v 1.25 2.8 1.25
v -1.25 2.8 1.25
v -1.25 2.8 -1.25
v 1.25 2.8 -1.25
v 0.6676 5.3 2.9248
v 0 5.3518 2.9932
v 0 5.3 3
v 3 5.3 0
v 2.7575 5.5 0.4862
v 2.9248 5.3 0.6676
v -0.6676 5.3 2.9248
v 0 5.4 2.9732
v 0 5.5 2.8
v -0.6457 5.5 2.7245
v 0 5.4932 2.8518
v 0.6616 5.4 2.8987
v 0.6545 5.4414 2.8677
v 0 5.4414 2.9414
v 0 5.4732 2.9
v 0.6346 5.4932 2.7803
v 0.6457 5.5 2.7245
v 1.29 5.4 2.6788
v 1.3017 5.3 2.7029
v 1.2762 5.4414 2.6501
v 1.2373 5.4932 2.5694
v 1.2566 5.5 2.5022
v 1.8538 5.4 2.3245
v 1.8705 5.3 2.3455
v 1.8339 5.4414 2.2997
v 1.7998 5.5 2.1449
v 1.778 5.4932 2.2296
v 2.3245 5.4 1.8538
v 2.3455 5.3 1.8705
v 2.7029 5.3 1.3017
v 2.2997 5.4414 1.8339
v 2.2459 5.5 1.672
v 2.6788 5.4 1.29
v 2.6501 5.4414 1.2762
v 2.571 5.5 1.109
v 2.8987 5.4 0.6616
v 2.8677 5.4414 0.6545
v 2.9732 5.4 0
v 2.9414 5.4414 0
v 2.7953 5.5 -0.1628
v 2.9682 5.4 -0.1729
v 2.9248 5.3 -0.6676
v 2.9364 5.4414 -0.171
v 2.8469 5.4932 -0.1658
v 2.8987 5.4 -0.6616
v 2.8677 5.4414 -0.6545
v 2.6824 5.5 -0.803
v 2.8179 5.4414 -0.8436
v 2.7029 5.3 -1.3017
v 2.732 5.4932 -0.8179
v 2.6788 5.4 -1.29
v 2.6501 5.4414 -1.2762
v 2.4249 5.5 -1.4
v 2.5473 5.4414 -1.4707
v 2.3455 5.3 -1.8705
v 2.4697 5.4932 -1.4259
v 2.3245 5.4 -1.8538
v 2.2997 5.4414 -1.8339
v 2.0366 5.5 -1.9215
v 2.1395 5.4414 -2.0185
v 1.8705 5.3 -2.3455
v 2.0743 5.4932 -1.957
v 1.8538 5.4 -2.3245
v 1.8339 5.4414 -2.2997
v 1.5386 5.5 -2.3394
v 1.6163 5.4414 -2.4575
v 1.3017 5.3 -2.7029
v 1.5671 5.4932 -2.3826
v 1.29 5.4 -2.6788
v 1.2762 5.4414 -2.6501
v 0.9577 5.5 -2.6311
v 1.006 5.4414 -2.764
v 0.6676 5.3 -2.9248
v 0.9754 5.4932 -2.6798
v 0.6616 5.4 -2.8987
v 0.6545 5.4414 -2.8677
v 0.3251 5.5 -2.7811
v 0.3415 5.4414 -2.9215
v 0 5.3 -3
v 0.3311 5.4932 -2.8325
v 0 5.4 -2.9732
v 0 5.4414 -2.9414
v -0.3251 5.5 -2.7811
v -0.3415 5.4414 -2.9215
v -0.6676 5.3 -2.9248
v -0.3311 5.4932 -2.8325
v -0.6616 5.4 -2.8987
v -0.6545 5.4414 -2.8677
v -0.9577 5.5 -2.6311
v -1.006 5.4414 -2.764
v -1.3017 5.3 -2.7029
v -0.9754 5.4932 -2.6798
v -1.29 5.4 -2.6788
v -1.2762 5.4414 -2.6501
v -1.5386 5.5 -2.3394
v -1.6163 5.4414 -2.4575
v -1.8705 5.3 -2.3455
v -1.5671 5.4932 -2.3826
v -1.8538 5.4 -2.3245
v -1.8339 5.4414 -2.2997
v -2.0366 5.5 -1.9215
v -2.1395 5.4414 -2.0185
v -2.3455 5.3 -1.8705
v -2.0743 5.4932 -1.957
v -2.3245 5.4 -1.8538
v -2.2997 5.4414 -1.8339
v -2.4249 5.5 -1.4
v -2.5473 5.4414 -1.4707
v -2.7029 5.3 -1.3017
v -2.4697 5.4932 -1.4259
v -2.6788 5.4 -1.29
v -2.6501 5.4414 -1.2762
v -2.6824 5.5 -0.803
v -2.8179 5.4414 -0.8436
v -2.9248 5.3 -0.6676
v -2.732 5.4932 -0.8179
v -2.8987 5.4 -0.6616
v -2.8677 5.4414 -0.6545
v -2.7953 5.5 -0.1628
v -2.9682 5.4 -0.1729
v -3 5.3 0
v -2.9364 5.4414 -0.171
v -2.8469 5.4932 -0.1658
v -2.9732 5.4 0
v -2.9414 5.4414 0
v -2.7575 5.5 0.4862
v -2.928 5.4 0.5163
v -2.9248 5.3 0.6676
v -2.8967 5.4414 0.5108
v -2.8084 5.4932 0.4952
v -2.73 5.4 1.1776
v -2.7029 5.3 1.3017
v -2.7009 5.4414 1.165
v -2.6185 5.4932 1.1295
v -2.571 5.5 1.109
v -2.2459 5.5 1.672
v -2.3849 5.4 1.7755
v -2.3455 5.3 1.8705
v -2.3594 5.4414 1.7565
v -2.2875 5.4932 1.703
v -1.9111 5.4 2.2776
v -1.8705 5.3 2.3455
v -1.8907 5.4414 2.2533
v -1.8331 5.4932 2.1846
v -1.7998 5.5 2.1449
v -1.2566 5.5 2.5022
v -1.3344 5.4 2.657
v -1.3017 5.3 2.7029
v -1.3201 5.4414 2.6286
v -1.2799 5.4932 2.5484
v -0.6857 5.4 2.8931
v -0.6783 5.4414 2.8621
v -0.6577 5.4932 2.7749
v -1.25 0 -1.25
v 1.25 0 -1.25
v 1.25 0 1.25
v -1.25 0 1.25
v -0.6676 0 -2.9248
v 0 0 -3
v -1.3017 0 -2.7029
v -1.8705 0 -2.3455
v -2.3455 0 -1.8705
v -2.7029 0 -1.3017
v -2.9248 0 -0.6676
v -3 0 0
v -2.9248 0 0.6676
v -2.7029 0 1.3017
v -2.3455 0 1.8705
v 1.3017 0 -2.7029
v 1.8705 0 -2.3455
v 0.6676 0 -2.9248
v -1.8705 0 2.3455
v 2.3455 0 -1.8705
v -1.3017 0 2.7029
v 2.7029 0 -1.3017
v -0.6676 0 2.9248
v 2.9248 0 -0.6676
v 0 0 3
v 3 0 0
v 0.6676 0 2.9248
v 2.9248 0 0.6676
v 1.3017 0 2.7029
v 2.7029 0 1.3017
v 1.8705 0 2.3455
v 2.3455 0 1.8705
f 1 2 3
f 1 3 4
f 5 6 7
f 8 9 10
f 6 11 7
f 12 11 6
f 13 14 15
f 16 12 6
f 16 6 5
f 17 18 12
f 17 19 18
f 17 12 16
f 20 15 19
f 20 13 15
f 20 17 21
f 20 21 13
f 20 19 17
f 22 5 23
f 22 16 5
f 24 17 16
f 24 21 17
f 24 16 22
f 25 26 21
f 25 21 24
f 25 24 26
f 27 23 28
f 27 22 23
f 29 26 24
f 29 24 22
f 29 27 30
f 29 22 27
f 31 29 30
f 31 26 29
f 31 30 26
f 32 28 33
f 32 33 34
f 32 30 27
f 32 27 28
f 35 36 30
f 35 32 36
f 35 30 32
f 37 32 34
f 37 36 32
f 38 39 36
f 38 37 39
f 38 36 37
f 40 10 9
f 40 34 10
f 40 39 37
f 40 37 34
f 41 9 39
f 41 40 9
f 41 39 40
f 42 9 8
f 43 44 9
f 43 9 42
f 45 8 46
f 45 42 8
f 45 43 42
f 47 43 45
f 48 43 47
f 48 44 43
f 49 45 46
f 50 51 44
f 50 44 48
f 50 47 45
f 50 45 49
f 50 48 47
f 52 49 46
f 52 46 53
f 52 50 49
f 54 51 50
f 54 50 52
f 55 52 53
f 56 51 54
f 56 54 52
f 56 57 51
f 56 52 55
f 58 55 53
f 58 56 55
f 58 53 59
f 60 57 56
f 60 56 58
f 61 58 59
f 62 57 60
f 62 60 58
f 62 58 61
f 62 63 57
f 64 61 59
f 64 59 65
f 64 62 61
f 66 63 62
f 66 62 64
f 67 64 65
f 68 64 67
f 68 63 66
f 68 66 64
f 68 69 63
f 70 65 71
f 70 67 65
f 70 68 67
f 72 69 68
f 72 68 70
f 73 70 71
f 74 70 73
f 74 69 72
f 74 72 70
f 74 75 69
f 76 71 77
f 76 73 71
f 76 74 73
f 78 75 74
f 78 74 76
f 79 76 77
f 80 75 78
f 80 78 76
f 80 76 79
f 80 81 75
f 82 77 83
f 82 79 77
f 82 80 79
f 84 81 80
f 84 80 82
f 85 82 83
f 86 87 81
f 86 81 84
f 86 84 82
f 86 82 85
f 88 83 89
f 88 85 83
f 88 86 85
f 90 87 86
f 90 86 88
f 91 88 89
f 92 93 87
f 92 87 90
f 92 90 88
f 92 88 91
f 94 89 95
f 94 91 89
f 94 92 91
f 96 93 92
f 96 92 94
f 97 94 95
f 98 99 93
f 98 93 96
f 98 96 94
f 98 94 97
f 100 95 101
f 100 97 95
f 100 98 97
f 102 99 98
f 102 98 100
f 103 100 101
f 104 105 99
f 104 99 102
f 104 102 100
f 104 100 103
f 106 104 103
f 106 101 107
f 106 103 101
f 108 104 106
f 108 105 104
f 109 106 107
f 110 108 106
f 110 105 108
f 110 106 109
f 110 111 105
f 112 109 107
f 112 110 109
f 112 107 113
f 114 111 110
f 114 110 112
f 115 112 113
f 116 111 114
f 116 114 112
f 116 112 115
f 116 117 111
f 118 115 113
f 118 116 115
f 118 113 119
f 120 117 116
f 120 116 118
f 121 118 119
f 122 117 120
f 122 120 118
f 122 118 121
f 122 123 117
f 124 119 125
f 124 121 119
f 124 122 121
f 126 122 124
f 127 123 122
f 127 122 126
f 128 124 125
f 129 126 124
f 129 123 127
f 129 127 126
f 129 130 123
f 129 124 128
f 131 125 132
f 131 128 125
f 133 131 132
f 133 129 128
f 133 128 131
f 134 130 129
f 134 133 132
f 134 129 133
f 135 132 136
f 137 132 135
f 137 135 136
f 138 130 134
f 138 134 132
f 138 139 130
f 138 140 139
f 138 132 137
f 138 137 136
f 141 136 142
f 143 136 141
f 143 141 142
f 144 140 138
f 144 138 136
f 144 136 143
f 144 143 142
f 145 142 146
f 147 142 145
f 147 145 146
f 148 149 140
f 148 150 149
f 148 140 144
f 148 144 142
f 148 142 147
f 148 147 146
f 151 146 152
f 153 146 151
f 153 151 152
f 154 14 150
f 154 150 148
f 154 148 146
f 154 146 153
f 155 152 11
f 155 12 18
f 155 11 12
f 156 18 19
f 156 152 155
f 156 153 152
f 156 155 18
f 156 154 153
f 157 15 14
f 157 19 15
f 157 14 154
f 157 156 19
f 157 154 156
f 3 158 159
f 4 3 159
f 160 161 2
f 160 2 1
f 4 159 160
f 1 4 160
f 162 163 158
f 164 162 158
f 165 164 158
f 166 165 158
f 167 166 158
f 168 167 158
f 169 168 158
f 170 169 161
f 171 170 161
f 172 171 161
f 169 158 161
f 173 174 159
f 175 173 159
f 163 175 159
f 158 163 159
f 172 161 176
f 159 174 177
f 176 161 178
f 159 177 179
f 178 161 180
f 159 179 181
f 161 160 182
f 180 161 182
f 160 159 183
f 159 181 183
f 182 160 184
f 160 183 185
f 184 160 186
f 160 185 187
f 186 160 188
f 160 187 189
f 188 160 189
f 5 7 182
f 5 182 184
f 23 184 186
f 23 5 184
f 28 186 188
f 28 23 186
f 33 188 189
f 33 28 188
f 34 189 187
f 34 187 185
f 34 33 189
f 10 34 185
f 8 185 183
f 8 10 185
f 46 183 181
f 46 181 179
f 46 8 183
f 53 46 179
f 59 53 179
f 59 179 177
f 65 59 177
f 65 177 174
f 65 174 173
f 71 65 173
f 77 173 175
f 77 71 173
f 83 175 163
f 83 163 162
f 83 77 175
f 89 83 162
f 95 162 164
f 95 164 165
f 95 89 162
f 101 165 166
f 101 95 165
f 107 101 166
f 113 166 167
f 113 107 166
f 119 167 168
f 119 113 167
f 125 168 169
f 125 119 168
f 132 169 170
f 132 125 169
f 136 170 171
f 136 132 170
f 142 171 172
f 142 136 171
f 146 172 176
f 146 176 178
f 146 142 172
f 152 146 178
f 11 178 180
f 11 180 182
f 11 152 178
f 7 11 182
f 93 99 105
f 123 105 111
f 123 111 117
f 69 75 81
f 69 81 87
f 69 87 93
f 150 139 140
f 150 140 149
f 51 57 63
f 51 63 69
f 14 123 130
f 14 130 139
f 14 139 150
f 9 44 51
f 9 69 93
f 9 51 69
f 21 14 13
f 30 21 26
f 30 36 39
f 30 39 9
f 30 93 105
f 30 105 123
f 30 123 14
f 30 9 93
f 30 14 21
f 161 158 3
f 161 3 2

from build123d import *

# Parameters (mm, degrees)
SKETCH1_W          = 3
SKETCH1_H          = 5.5
SKETCH2_W          = 2.5
SKETCH2_H          = 2.5
CUT_EXTRUDE1_DEPTH = 2.8
FILLET1_R          = 0.2


with BuildPart() as part:
    # Sketch1 → Revolve1 (revolve)
    with BuildSketch(Plane(origin=(0, 0, 0), x_dir=(-1, 0, 0), z_dir=(0, 0, -1)), mode=Mode.PRIVATE) as revolve1_sk:
        with Locations((-1.5, 2.75)):
            Rectangle(SKETCH1_W, SKETCH1_H)
    revolve(revolve1_sk.sketch.rotate(Axis((0, 0, 0), (0, 1, 0)), 270), axis=Axis((0, 0, 0), (0, 1, 0)))

    # Sketch2 → Cut-Extrude1 (cut)
    with BuildSketch(Plane.XZ):
        Rectangle(SKETCH2_W, SKETCH2_H)
    extrude(amount=-CUT_EXTRUDE1_DEPTH, mode=Mode.SUBTRACT)

    # Fillet1
    fillet1_edges = [part.edges().sort_by_distance(p)[0] for p in [
        (0, 5.5, -3),
    ]]
    fillet(fillet1_edges, radius=FILLET1_R)


solid = part.part
